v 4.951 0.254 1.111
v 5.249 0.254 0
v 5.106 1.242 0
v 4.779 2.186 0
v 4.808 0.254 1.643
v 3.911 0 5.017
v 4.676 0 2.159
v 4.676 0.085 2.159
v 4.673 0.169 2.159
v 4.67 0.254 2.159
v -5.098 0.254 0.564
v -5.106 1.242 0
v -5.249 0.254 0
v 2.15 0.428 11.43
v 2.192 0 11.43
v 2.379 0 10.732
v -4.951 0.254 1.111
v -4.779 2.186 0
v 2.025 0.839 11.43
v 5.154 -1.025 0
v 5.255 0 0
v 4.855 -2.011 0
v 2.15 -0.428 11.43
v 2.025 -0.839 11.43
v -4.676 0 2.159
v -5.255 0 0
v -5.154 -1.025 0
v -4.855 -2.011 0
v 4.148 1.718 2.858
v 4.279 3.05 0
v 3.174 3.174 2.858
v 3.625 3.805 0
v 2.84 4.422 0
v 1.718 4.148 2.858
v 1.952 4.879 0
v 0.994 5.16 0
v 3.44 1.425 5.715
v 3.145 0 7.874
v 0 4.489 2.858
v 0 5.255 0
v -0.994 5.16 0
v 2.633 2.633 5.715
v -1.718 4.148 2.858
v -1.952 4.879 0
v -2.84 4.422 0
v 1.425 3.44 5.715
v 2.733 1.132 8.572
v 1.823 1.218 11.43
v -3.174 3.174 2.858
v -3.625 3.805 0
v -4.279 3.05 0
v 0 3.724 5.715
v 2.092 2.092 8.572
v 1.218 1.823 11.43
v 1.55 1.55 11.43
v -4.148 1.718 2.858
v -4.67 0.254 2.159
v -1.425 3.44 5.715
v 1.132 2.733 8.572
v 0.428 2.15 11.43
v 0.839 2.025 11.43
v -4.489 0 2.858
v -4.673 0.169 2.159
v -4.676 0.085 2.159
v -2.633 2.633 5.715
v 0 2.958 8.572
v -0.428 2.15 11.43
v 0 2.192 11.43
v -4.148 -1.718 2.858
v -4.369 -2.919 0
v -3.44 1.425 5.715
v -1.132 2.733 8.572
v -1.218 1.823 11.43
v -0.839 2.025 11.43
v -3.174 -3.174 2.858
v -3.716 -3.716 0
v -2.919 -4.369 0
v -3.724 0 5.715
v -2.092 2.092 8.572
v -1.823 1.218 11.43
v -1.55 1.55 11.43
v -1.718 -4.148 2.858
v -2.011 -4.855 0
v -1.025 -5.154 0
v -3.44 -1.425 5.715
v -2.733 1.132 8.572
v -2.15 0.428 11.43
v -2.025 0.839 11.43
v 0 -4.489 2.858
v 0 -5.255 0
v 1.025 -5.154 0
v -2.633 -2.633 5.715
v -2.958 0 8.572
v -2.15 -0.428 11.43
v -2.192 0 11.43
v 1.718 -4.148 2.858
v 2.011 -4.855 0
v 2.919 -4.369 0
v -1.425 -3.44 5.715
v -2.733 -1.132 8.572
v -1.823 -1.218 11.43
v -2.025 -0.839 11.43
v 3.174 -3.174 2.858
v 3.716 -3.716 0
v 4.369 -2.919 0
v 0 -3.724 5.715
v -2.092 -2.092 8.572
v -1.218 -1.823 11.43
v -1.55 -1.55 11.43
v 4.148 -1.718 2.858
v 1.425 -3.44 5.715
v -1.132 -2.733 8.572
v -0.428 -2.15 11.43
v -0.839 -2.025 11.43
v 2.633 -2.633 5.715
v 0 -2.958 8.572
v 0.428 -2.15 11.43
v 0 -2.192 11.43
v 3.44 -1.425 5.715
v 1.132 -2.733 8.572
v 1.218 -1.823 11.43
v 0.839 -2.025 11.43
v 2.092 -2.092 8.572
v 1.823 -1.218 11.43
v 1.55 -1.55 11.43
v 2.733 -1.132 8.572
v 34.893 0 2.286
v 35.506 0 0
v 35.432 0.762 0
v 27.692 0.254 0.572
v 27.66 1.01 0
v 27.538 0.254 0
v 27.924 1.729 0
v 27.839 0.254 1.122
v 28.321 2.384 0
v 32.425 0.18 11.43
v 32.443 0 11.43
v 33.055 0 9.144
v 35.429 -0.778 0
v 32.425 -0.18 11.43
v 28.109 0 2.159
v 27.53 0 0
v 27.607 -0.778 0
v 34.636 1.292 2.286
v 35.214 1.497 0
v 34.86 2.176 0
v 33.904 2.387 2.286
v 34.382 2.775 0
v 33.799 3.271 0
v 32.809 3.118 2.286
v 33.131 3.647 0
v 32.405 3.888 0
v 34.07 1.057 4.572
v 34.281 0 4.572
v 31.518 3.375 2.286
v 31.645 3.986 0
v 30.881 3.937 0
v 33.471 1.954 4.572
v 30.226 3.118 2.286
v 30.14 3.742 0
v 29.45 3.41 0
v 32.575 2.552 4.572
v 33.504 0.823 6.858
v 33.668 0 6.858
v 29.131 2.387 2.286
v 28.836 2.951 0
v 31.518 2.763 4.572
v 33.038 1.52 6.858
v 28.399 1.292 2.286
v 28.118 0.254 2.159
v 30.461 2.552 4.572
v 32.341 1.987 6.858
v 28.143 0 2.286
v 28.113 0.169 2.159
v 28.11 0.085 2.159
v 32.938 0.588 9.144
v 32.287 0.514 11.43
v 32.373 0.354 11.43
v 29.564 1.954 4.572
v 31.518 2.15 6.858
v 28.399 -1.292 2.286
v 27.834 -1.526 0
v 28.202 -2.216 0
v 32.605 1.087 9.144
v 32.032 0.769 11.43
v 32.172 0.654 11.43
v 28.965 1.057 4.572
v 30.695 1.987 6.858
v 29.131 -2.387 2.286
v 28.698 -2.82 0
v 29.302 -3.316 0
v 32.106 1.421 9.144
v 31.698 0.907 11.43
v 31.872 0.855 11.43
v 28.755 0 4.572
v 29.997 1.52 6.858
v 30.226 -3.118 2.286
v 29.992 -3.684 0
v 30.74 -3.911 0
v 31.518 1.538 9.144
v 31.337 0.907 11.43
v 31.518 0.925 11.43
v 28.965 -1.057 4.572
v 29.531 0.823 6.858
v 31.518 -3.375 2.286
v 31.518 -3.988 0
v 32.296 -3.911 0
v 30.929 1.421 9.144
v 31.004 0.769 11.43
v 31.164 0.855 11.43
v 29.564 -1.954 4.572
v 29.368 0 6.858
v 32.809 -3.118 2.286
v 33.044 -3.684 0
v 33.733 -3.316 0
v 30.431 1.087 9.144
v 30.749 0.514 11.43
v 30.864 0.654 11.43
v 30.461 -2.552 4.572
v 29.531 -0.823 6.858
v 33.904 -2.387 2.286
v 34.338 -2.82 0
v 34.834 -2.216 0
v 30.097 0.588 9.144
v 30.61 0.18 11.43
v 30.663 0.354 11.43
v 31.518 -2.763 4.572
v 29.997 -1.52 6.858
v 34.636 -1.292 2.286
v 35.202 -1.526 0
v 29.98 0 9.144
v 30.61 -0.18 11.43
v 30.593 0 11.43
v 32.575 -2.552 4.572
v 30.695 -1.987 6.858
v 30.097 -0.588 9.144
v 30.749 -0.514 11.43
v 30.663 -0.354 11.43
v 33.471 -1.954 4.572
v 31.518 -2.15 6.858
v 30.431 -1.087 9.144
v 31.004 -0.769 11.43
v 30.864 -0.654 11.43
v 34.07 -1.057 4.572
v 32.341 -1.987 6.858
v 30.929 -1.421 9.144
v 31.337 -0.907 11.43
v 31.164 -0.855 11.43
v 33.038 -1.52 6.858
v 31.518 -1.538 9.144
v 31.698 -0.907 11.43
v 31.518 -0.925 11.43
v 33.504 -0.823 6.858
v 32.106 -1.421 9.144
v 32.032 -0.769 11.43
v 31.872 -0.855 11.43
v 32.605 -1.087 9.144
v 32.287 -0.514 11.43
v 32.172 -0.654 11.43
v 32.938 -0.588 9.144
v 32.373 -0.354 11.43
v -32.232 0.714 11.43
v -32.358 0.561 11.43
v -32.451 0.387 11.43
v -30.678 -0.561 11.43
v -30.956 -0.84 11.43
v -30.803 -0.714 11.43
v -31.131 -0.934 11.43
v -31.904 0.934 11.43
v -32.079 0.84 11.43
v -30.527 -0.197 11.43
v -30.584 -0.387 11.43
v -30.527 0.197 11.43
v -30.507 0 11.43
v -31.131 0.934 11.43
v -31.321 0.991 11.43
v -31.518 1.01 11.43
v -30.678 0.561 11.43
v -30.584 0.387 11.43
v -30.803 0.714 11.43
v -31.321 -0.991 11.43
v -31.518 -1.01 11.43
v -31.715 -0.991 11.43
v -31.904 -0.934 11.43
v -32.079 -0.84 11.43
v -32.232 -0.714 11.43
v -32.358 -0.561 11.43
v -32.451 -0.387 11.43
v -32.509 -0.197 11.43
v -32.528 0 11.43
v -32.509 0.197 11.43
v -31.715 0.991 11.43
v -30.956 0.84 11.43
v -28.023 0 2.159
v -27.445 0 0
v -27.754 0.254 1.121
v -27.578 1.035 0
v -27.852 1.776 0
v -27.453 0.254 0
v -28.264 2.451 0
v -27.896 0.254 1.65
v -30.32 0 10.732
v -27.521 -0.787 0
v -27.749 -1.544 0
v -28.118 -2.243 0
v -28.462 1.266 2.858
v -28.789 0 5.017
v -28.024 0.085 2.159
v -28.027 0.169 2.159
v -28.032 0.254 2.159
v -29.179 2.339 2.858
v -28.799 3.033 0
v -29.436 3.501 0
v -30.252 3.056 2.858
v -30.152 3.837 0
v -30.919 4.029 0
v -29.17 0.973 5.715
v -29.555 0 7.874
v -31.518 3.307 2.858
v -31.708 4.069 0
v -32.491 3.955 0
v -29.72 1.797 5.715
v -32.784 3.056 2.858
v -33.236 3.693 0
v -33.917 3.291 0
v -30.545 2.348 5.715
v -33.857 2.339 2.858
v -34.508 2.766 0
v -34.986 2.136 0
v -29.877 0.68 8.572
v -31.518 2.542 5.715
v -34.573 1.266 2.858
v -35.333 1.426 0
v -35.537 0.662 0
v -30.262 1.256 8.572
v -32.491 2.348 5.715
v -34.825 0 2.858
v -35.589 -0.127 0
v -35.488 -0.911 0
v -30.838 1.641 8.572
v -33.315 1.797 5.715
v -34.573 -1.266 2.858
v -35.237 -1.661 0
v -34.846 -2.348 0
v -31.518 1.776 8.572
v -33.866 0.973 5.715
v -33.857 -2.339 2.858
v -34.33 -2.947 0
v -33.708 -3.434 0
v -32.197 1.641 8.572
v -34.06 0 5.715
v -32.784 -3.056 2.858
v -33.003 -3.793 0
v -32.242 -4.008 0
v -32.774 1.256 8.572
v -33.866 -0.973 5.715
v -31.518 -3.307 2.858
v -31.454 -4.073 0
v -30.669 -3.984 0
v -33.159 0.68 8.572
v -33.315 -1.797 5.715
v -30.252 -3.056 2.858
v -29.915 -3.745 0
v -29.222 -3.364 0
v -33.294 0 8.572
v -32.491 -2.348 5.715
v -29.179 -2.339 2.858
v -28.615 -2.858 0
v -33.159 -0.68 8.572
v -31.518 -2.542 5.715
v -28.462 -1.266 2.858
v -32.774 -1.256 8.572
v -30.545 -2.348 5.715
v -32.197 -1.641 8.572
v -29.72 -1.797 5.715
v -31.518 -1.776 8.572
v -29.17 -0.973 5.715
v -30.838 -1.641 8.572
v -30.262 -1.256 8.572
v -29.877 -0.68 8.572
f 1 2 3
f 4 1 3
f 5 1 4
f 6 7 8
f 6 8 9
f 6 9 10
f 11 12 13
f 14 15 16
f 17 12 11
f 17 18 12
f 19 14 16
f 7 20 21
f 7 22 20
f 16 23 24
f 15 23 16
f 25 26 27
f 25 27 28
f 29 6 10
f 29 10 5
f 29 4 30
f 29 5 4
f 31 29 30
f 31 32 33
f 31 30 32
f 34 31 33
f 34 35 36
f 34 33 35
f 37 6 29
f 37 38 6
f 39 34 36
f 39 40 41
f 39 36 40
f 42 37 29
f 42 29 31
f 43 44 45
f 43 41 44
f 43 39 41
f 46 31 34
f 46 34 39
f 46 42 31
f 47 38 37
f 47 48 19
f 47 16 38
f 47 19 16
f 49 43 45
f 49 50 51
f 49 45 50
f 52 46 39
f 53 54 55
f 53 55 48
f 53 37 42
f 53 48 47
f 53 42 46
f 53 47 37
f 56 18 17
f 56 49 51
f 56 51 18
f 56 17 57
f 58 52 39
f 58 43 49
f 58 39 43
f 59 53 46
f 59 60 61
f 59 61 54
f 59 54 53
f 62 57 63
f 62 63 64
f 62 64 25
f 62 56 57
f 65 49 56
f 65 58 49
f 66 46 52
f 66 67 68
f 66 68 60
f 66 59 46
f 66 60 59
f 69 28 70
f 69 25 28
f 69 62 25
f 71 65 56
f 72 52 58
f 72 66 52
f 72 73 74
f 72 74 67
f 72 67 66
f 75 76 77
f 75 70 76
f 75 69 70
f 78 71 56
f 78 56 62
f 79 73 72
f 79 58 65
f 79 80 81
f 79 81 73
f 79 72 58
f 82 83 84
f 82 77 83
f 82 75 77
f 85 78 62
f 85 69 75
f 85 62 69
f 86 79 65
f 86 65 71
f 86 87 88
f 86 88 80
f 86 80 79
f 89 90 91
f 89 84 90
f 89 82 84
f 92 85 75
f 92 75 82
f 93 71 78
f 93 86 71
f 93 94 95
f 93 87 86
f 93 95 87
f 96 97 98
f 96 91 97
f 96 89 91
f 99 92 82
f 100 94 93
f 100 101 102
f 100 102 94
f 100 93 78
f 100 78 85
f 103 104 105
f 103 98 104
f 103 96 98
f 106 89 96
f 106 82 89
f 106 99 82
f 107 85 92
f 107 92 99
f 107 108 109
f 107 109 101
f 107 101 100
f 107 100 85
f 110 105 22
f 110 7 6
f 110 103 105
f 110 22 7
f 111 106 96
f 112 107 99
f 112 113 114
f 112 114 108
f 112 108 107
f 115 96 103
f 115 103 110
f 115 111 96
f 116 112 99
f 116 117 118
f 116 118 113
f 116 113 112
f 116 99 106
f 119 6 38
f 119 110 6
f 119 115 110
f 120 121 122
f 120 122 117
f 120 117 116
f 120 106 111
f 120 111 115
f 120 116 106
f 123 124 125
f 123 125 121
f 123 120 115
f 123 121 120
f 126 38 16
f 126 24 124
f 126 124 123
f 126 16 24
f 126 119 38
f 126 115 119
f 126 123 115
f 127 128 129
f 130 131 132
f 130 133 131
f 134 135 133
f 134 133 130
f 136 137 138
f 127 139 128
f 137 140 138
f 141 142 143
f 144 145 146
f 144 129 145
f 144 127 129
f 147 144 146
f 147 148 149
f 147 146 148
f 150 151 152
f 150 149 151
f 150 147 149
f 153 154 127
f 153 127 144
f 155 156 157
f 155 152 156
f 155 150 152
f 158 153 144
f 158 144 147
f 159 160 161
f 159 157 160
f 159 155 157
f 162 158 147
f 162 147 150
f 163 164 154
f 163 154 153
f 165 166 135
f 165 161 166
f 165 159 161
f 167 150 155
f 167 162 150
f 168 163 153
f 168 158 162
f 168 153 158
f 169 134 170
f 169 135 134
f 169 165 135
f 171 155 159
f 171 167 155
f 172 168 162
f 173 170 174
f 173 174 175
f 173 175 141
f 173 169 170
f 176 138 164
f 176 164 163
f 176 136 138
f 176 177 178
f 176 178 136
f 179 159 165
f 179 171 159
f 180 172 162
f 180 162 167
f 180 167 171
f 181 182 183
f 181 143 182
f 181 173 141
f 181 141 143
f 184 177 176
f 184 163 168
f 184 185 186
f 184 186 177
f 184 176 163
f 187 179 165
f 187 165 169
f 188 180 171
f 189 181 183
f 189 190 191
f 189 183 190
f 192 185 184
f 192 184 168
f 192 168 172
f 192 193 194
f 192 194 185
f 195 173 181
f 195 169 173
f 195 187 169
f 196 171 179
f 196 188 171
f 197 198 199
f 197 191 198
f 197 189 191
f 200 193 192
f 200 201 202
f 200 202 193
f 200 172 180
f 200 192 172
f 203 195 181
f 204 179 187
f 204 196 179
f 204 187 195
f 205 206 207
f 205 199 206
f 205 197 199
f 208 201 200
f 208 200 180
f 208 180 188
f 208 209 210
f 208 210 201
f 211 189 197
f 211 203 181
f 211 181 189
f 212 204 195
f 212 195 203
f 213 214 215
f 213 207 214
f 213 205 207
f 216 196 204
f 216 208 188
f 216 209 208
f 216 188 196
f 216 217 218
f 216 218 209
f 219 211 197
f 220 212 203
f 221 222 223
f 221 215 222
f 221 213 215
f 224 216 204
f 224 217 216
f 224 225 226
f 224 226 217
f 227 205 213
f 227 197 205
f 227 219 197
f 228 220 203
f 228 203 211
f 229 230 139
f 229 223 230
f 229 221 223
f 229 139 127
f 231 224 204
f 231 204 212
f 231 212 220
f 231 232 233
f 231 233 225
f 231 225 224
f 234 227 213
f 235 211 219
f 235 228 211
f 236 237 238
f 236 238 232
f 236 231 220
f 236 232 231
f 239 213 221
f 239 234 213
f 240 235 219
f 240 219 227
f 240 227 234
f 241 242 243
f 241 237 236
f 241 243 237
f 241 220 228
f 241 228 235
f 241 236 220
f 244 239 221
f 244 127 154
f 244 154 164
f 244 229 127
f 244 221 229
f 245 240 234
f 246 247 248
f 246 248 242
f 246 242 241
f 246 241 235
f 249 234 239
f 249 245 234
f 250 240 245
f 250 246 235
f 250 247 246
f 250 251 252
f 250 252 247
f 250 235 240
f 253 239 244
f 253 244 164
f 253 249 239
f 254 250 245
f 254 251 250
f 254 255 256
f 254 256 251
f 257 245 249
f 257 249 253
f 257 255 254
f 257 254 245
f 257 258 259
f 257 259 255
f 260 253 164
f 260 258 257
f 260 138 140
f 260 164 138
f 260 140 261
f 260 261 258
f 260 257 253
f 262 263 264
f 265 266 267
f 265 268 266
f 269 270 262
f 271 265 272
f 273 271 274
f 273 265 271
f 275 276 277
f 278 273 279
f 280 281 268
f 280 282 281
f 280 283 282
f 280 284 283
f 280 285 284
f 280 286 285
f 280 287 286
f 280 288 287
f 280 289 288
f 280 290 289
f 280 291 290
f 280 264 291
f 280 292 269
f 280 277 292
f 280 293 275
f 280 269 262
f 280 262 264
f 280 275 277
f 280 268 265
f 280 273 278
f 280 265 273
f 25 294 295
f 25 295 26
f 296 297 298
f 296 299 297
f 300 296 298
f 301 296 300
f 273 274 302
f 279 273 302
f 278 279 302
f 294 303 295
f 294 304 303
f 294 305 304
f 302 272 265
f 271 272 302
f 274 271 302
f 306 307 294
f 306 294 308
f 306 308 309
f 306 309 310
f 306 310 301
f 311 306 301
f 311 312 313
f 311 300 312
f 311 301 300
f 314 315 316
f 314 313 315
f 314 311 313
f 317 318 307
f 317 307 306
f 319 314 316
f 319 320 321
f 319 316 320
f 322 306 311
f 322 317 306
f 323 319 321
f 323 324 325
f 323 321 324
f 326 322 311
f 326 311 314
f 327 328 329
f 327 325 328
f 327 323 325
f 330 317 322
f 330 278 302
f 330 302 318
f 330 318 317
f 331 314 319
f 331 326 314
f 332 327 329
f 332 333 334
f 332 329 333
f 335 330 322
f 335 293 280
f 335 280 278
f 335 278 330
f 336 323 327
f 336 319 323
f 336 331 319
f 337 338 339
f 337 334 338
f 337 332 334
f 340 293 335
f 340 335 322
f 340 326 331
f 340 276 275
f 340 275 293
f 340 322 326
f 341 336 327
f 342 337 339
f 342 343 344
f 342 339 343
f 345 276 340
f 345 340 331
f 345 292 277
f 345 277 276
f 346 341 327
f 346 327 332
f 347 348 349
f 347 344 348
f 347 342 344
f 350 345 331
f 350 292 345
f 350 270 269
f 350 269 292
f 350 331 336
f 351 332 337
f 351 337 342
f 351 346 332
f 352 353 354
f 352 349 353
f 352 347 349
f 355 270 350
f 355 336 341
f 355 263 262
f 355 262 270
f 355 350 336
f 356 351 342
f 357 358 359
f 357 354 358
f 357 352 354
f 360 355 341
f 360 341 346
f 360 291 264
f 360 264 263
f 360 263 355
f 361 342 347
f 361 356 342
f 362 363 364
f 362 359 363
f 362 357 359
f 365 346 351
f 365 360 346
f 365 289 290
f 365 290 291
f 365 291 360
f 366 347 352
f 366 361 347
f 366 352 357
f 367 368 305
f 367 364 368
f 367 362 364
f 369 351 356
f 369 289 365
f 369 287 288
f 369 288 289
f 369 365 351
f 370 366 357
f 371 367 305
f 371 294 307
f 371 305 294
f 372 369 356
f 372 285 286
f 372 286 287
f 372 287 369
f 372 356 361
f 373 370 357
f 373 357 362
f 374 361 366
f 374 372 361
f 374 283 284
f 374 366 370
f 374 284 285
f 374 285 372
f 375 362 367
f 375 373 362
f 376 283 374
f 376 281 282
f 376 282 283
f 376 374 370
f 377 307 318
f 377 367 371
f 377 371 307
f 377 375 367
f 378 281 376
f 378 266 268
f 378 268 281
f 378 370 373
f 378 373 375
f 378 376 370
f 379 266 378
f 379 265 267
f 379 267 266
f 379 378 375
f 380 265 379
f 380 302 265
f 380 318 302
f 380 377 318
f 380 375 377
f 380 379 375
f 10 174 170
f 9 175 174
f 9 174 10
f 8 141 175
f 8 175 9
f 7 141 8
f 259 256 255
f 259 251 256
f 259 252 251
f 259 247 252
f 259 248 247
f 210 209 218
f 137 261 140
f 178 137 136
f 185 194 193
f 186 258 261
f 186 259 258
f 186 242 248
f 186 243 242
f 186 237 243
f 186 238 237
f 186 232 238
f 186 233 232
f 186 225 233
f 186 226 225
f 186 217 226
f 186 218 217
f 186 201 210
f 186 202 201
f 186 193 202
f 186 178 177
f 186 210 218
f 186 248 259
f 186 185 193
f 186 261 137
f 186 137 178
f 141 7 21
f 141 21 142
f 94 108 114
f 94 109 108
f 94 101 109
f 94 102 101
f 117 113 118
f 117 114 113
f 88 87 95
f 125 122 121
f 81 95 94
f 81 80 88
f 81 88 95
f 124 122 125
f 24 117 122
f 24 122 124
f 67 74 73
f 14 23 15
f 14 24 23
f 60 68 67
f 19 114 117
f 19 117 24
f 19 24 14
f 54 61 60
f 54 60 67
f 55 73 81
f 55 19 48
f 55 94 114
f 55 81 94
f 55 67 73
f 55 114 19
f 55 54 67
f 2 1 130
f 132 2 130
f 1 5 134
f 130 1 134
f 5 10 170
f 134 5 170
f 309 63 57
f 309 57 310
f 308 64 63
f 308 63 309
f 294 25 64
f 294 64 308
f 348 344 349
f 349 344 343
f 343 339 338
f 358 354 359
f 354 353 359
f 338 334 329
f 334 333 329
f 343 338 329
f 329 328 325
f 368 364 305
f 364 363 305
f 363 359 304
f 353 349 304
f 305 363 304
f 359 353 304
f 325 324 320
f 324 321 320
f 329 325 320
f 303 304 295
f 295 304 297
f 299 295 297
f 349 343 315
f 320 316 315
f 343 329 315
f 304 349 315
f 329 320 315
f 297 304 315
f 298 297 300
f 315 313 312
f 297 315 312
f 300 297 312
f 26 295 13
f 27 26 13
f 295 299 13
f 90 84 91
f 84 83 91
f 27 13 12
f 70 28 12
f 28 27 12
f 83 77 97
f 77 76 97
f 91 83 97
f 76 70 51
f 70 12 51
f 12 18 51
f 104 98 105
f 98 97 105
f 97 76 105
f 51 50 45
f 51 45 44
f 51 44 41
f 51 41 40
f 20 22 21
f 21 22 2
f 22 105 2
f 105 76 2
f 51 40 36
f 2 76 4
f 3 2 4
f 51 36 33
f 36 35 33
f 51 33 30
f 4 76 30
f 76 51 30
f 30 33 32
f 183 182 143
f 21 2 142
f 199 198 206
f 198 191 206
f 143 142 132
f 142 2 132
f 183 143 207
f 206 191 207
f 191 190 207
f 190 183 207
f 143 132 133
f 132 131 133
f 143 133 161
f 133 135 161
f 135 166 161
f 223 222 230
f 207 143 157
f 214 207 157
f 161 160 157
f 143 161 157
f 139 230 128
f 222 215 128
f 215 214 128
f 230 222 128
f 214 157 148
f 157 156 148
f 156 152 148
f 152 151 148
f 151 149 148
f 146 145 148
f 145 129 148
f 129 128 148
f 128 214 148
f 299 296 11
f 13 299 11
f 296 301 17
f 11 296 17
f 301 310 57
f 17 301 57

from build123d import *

# Parameters (mm, degrees)
F0_R     = 5.2549557128
F1_DEPTH = 11.43
F1_TAPER = 15
F0_R_2   = 3.9878
F0_R_3   = 4.0731099985
F3_DEPTH = 0.254


with BuildPart() as f1:
    # F0 (on Top) → F1 (new body)
    with BuildSketch(Plane.XY):
        Circle(F0_R)
    extrude(amount=F1_DEPTH, taper=F1_TAPER)



with BuildPart() as f1b:
    # F0 (on Top) → F1, piece 2 (new body)
    with BuildSketch(Plane.XY):
        with Locations((31.517803368, 0)):
            Circle(F0_R_2)
    extrude(amount=F1_DEPTH, taper=F1_TAPER)


with BuildPart() as f1c:
    # F0 (on Top) → F1, piece 3 (new body)
    with BuildSketch(Plane.XY):
        with Locations((-31.517803368, 0)):
            Circle(F0_R_3)
    extrude(amount=F1_DEPTH, taper=F1_TAPER)


with BuildPart() as f1_1:
    add(f1.part)

    add(f1b.part)  # F3 merges F1b

    add(f1c.part)  # F3 merges F1c
    # F2 (on Front) → F3 (join)
    with BuildSketch(Plane.XZ):
        Polygon((-31.5407924354, 2.1590758115), (-31.0882329941, 0), (0, 0), (32.4205830693, 0), (32.4205830693, 2.1590758115), (0, 2.1590758115), align=None)
    extrude(amount=-F3_DEPTH)


solid = f1_1.part
